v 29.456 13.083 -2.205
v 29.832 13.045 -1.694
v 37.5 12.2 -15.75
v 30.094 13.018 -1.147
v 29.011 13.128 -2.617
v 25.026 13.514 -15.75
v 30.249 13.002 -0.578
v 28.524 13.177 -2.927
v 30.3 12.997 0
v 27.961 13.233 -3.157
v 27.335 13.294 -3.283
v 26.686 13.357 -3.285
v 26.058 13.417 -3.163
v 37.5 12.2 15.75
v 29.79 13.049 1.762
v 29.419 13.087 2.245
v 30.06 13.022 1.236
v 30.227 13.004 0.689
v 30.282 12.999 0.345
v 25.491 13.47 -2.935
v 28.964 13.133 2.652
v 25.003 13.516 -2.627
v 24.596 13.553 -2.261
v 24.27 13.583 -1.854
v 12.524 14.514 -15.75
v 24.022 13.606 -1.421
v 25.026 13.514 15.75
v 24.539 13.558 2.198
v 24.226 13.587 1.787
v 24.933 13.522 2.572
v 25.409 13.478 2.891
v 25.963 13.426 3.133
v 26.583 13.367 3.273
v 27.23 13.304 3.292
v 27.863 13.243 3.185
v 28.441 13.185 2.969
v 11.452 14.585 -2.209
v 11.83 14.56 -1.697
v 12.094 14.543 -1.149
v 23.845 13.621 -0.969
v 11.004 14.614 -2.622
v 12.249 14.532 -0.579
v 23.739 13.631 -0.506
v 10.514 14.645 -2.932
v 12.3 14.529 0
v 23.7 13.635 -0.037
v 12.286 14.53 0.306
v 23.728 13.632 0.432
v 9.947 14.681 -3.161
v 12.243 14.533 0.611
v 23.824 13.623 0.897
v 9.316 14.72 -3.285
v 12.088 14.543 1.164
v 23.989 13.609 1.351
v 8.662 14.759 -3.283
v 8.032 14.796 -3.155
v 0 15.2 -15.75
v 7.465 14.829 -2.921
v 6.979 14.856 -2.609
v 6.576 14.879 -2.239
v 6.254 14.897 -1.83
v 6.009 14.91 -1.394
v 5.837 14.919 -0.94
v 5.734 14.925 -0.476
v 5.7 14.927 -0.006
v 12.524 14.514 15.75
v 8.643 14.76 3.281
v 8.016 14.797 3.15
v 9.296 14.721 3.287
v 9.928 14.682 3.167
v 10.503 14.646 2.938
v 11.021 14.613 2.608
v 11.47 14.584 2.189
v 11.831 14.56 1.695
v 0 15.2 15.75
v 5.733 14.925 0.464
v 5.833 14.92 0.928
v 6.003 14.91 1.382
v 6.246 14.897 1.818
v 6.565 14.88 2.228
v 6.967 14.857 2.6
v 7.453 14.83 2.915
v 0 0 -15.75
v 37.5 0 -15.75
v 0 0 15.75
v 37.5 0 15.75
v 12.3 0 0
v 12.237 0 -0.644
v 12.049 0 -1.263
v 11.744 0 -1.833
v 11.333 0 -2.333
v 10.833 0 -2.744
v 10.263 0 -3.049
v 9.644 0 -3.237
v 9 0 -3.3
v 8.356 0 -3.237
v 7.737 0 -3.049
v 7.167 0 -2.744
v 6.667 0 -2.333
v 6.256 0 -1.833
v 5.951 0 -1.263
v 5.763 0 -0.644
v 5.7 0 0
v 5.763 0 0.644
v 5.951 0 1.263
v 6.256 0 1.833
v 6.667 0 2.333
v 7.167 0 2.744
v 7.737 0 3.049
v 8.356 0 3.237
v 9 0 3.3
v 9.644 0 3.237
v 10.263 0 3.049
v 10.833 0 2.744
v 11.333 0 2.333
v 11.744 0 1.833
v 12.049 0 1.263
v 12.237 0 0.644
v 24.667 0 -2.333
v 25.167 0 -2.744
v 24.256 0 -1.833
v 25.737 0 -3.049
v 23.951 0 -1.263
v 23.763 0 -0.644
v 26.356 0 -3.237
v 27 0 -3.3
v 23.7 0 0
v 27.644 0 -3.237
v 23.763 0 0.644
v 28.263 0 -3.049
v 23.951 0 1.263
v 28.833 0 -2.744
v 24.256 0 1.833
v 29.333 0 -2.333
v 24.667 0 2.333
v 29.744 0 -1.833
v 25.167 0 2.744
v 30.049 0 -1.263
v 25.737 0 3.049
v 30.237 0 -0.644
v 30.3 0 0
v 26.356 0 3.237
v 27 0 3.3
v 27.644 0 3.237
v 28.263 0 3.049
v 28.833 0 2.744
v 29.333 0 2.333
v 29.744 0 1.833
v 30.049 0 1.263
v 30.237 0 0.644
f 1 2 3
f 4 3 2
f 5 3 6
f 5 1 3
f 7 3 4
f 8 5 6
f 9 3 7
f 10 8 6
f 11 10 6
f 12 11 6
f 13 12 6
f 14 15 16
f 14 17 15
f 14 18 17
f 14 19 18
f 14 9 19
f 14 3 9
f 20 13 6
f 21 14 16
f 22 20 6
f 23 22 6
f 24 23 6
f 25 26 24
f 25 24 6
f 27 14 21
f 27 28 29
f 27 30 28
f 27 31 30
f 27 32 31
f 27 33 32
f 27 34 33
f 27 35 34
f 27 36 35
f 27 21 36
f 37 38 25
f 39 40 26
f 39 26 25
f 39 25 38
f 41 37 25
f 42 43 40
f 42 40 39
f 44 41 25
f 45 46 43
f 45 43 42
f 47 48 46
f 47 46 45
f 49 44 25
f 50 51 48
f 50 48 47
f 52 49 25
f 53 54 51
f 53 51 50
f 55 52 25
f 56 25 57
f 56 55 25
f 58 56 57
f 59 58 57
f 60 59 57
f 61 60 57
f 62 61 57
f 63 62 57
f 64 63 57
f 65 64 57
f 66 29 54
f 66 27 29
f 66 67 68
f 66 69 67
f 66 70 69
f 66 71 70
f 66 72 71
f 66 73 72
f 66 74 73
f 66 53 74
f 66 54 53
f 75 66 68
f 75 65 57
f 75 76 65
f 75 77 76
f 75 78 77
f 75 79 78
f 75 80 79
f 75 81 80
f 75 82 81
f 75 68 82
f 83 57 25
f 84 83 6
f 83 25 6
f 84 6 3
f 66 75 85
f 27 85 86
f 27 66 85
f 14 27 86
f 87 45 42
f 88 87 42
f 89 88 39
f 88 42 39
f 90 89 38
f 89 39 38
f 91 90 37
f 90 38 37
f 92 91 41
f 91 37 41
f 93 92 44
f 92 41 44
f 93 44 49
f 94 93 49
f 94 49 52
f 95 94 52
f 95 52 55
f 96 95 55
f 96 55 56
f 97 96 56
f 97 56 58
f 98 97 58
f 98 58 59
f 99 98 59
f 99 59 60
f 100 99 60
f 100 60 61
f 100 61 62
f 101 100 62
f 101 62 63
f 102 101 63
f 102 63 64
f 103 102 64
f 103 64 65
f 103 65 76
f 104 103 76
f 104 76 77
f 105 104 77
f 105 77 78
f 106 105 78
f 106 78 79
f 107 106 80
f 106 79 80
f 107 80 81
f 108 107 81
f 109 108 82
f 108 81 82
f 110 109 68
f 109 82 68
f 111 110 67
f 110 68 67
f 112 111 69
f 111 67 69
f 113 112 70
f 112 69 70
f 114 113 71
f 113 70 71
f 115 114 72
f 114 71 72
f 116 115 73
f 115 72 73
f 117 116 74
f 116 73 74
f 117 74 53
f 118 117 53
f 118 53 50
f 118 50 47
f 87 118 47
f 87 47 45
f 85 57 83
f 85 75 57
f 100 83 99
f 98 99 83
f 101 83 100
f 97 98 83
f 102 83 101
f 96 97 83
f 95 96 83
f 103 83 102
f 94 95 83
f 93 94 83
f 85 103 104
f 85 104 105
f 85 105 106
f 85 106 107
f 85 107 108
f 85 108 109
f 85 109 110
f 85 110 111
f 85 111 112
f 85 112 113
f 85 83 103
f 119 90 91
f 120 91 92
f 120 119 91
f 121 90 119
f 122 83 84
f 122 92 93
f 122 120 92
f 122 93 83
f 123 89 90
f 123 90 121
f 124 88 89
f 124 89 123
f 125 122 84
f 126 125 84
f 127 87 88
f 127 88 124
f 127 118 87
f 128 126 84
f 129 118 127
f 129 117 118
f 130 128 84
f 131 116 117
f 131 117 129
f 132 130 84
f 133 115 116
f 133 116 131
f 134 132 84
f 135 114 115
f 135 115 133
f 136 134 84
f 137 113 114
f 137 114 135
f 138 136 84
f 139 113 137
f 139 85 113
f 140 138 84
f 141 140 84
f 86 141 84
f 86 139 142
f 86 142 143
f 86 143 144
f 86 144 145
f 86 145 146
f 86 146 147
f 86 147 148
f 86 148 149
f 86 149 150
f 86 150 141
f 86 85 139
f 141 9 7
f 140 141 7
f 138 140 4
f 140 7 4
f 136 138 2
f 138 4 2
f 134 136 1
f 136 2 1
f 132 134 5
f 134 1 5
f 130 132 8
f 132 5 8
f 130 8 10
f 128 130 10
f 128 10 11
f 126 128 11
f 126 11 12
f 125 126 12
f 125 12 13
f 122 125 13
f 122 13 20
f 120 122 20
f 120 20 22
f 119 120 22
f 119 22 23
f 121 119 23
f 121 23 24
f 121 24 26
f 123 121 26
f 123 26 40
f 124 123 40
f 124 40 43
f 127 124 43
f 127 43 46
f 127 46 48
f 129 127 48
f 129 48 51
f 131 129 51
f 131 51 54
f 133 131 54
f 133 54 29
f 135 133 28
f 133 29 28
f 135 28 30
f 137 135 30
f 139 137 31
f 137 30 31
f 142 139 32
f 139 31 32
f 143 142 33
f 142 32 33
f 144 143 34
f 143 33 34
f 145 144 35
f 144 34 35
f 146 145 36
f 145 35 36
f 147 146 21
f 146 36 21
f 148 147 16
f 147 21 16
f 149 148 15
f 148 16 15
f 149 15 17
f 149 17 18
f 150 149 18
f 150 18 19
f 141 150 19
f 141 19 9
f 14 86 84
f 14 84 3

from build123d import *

# Parameters (mm, degrees)
BOSS_EXTRU_1_DEPTH = 15.75
D_GAGEMENT_M61_D   = 6.6


with BuildPart() as part:
    # Esquisse1 → Boss.-Extru.1 (new body, symmetric)
    with BuildSketch(Plane.XY):
        with BuildLine():
            Line((0, 0), (37.5, 0))
            Line((37.5, 0), (37.5, 12.2))
            ThreePointArc((37.5, 12.2), (18.778224846, 14.052810579), (0, 15.2))
            Line((0, 15.2), (0, 0))
        make_face()
    extrude(amount=BOSS_EXTRU_1_DEPTH, both=True)

    # Dégagement M61 (through all)
    with Locations(Plane(origin=(0, 0, 0), x_dir=(-1, 0, 0), z_dir=(0, -1, 0))):
        with Locations((-9, 0), (-27, 0)):
            Hole(D_GAGEMENT_M61_D / 2)


solid = part.part
